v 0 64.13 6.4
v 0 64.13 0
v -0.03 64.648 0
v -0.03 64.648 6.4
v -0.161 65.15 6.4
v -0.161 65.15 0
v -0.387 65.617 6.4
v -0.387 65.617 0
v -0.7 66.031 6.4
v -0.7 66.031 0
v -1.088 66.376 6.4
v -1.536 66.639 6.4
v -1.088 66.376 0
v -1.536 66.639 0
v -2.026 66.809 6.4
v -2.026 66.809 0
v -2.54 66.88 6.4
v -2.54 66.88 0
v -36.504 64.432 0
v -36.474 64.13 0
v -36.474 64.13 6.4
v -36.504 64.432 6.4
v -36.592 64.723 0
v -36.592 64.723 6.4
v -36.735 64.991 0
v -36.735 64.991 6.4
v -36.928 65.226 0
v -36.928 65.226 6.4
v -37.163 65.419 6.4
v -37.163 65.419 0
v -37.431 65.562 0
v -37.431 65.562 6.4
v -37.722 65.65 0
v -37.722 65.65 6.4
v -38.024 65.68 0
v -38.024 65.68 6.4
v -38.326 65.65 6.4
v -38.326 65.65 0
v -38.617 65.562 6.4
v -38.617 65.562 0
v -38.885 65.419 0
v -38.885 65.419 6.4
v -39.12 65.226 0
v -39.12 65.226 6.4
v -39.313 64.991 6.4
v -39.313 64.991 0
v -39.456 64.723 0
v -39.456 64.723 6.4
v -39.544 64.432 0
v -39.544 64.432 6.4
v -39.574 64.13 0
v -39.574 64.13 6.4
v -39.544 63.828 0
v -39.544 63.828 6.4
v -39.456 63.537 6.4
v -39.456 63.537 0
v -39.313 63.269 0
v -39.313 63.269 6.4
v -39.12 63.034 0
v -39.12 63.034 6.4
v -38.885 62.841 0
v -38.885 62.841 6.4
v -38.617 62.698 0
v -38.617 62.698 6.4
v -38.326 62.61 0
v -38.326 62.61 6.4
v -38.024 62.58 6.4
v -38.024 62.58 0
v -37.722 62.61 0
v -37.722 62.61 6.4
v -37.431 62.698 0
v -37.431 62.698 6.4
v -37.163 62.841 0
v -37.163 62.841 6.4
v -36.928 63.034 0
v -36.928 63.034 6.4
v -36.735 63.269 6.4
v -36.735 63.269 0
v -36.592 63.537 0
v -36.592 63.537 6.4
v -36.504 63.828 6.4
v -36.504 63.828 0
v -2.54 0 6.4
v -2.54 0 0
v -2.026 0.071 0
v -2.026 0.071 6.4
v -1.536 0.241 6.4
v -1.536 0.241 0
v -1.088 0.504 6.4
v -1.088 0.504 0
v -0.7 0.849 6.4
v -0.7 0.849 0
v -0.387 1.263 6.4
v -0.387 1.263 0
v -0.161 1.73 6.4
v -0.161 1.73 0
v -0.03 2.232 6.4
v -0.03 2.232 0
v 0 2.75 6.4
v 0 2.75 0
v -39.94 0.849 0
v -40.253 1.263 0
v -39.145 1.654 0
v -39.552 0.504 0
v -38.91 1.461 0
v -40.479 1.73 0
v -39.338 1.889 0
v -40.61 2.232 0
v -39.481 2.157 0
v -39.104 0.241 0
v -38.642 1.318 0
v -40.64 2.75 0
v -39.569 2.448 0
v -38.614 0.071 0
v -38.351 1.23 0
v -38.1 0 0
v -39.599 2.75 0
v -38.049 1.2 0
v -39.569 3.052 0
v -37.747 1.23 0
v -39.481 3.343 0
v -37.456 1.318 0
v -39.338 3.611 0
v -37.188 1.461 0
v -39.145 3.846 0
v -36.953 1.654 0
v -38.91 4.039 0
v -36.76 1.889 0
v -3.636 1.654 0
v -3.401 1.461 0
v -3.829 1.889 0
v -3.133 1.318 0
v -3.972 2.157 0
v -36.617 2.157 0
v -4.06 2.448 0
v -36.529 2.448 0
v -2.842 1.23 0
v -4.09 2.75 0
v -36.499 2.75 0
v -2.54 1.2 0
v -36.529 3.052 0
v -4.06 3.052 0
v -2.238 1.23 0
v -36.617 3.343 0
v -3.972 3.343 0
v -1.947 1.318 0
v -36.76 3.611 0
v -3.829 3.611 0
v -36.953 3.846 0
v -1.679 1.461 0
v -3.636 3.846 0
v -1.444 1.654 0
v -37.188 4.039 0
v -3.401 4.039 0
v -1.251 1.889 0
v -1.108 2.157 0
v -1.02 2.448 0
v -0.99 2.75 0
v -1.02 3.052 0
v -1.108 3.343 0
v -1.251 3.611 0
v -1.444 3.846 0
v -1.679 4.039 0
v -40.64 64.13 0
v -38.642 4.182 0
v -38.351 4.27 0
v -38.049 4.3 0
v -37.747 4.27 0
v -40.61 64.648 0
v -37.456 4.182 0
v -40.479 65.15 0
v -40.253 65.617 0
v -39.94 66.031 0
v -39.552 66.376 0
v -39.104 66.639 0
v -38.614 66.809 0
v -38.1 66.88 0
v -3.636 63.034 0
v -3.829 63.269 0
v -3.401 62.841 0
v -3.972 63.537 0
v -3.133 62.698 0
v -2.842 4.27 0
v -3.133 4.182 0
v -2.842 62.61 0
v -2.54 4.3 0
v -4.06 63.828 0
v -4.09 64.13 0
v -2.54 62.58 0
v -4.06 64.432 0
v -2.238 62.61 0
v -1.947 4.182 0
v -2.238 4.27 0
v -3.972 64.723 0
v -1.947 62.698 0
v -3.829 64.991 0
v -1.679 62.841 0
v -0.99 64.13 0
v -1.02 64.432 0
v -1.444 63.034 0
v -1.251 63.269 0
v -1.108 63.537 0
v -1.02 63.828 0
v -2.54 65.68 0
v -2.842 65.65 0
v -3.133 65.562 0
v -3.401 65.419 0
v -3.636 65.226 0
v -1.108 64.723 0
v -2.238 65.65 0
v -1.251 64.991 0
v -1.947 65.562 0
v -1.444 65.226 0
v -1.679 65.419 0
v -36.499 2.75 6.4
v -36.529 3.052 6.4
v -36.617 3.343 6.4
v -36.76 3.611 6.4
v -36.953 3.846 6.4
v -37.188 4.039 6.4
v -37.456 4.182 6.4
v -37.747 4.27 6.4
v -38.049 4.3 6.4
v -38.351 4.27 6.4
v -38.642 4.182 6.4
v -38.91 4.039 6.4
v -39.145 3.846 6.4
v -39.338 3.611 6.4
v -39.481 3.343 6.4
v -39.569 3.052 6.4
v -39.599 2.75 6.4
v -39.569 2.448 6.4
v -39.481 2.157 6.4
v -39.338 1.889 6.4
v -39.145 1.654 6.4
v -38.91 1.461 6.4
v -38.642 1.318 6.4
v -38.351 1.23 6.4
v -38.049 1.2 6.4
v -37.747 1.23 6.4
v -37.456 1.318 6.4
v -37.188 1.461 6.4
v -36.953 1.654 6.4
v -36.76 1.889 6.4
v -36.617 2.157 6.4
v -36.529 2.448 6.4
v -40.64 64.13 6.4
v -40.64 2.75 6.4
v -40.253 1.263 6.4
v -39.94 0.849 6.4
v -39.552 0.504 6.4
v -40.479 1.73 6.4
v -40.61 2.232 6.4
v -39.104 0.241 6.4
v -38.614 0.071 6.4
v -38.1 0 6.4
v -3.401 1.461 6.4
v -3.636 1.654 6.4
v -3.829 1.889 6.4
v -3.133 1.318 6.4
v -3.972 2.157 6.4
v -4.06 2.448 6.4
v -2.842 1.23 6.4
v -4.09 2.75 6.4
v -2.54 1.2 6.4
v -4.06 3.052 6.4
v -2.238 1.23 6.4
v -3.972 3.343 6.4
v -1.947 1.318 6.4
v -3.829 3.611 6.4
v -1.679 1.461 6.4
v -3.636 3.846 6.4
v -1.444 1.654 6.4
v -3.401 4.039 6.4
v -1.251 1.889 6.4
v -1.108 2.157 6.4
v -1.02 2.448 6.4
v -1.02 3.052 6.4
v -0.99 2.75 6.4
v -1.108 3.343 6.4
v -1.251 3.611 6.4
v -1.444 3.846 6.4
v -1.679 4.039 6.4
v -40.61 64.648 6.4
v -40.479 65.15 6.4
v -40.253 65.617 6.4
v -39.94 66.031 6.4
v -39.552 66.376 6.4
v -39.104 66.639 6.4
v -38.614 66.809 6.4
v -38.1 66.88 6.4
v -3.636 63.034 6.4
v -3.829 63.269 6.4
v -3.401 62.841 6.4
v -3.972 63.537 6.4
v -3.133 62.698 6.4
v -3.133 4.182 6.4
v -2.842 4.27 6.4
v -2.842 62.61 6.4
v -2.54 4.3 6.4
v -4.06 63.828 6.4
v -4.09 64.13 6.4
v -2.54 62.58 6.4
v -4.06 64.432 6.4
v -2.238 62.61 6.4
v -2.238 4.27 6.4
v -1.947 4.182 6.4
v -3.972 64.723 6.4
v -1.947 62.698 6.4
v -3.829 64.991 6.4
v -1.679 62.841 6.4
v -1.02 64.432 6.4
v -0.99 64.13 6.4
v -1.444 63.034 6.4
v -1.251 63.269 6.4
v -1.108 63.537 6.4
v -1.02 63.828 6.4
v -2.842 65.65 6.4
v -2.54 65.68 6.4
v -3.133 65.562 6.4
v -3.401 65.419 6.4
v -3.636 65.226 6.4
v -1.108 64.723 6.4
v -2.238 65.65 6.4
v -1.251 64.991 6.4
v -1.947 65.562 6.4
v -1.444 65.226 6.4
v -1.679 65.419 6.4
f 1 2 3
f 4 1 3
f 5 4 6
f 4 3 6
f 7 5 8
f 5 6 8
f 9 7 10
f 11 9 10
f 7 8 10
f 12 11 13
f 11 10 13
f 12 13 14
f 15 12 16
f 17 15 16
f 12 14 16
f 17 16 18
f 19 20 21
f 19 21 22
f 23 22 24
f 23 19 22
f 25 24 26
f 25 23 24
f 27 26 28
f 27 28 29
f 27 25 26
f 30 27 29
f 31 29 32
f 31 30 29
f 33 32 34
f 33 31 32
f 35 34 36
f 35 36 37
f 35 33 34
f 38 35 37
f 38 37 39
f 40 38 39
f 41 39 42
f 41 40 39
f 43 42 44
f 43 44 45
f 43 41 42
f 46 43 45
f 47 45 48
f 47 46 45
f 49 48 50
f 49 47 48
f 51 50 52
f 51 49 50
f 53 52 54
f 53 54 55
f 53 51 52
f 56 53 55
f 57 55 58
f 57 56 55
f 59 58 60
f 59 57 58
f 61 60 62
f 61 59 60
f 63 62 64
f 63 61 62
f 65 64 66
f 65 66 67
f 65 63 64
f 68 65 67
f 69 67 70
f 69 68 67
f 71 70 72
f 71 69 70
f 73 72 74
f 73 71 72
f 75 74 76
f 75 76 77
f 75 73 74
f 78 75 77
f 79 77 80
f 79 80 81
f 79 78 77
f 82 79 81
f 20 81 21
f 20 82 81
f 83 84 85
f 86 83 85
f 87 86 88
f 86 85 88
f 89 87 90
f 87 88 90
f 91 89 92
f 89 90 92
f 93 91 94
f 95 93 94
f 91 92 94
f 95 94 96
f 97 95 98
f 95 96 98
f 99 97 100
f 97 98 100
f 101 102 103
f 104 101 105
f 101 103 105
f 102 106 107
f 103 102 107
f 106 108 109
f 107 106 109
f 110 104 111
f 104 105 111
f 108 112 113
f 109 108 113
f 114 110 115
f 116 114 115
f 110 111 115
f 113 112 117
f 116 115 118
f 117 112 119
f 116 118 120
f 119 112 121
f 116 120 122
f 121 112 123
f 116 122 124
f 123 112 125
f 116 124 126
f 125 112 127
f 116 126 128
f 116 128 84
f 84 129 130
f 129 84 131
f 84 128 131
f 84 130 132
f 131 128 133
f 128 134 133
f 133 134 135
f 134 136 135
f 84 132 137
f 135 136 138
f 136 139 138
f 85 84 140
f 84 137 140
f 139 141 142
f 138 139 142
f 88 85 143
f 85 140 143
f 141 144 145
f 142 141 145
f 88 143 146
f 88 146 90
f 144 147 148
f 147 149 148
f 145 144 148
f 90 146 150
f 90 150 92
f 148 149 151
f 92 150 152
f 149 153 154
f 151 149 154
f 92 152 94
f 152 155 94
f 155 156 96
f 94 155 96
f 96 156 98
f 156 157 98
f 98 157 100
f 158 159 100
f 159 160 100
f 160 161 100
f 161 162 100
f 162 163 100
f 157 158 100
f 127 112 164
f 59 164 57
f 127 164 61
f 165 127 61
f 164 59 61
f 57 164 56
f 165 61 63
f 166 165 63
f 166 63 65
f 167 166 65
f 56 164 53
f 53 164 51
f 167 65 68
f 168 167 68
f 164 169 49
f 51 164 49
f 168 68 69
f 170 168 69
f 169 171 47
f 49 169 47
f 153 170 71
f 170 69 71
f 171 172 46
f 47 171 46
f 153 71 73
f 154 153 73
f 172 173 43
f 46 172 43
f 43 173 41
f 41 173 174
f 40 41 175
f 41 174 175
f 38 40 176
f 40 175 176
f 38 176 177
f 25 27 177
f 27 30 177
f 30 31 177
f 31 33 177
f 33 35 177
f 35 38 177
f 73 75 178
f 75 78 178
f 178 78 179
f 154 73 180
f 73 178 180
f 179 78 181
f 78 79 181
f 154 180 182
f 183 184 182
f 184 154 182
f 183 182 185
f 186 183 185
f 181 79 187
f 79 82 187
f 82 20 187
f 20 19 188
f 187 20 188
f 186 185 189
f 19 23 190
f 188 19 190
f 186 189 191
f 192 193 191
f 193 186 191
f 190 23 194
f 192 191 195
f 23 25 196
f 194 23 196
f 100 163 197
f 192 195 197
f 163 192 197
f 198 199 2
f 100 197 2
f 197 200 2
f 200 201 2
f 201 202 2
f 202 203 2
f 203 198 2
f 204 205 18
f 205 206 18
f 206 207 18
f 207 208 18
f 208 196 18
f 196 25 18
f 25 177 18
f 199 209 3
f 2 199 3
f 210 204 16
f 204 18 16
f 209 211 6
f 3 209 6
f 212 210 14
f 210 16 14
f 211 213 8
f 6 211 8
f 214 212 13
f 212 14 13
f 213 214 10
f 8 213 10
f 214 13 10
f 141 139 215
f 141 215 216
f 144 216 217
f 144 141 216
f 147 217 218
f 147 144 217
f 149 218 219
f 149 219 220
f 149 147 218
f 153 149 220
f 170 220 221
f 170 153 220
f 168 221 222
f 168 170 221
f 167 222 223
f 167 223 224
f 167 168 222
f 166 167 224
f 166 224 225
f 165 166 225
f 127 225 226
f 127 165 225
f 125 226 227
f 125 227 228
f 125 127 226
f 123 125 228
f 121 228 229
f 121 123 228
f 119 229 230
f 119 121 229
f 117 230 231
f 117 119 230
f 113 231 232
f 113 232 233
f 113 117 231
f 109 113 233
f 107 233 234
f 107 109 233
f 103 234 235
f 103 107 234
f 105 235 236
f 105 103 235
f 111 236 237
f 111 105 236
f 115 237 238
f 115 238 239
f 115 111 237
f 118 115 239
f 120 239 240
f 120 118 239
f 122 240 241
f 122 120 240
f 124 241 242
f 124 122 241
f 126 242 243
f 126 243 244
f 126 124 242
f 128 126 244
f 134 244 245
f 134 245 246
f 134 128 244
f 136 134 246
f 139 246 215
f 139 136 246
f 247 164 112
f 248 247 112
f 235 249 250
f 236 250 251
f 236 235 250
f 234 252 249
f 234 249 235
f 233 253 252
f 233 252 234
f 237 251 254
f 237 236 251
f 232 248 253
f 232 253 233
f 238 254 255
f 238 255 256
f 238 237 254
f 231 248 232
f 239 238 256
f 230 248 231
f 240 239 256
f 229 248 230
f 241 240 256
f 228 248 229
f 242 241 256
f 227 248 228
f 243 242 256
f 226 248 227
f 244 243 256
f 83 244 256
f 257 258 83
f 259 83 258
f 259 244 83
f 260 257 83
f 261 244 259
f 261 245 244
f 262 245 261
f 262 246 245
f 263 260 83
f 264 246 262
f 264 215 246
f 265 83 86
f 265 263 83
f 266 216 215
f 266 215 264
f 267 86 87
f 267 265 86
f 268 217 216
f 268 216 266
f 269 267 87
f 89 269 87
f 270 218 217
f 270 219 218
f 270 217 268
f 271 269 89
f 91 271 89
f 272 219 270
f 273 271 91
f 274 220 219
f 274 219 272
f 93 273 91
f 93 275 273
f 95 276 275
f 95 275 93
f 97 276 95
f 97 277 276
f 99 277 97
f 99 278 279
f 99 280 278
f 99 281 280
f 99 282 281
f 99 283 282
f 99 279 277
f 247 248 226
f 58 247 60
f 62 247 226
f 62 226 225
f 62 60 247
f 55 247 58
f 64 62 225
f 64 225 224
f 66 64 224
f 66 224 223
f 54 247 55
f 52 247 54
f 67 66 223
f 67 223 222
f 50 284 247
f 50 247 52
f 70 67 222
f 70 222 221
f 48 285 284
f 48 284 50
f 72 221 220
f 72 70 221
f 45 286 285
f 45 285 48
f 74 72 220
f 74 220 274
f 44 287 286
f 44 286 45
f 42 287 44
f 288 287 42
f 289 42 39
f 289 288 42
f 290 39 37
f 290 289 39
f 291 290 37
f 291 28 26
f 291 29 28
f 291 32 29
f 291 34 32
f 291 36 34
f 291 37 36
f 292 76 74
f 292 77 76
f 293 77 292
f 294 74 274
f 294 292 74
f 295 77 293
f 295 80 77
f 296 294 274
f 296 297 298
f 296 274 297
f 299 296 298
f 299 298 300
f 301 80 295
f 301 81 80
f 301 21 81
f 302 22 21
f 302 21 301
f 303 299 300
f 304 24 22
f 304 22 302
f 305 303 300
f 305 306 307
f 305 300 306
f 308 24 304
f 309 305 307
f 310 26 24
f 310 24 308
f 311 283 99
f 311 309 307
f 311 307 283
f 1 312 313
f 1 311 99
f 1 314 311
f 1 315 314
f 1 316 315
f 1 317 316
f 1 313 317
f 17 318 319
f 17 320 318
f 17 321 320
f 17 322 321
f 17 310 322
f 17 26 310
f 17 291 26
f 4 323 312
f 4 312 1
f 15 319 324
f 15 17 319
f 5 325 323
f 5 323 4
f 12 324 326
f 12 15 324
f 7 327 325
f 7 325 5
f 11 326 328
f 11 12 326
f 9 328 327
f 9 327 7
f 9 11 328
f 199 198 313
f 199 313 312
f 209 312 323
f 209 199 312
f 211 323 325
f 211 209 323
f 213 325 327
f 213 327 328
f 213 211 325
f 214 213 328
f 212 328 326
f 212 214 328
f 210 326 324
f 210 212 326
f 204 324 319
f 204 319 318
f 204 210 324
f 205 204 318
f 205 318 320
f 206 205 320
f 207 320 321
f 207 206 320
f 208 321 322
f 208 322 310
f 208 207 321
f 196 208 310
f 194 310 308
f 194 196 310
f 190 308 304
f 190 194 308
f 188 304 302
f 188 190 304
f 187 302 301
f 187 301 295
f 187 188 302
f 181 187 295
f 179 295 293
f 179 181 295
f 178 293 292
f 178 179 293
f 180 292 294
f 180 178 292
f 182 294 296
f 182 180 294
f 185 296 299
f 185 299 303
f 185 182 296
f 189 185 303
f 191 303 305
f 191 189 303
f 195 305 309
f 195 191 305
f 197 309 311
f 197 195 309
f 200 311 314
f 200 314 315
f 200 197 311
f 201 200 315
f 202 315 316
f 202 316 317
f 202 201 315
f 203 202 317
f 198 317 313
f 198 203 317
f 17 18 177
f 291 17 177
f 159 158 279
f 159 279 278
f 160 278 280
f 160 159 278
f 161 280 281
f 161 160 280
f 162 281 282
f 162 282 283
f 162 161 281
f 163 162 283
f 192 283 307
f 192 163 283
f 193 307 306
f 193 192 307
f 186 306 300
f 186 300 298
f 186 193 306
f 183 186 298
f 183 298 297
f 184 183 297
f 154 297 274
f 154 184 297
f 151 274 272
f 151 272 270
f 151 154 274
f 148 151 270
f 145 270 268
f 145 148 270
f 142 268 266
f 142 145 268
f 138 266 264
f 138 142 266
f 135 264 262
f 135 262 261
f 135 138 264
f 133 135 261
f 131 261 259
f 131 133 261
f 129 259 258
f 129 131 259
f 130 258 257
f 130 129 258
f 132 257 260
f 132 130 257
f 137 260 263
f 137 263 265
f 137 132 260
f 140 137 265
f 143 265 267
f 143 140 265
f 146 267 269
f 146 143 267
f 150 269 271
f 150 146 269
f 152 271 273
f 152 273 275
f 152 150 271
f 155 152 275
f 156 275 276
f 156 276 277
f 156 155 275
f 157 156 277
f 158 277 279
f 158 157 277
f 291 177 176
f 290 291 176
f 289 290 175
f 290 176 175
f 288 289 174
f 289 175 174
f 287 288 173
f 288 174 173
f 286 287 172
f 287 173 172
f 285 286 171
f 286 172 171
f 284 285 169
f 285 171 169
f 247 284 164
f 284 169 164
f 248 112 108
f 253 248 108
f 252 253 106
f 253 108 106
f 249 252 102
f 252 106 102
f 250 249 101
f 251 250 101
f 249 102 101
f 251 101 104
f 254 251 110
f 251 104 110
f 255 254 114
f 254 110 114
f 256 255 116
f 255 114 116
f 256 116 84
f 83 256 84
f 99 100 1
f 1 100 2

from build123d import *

# Parameters (mm, degrees)
SKETCH_1_R      = 1.55
EXTRUDE_1_DEPTH = 6.4


with BuildPart() as part:
    # 草图1 → 凸台-拉伸1 (new body)
    with BuildSketch(Plane.XY):
        with BuildLine():
            Line((0, 2.75), (0, 64.13))
            ThreePointArc((0, 64.13), (-0.700235603, 66.031255116), (-2.54, 66.88))
            Line((-2.54, 66.88), (-38.1, 66.88))
            ThreePointArc((-38.1, 66.88), (-39.939764397, 66.031255116), (-40.64, 64.13))
            Line((-40.64, 64.13), (-40.64, 2.75))
            ThreePointArc((-40.64, 2.75), (-39.939764397, 0.848744884), (-38.1, 0))
            Line((-38.1, 0), (-2.54, 0))
            ThreePointArc((-2.54, 0), (-0.700235603, 0.848744884), (0, 2.75))
        make_face()
        with Locations((-2.54, 2.75)):
            Circle(SKETCH_1_R, mode=Mode.SUBTRACT)
        with Locations((-2.54, 64.13)):
            Circle(SKETCH_1_R, mode=Mode.SUBTRACT)
        with Locations((-38.049, 2.75)):
            Circle(SKETCH_1_R, mode=Mode.SUBTRACT)
        with Locations((-38.024, 64.13)):
            Circle(SKETCH_1_R, mode=Mode.SUBTRACT)
    extrude(amount=EXTRUDE_1_DEPTH)


solid = part.part
